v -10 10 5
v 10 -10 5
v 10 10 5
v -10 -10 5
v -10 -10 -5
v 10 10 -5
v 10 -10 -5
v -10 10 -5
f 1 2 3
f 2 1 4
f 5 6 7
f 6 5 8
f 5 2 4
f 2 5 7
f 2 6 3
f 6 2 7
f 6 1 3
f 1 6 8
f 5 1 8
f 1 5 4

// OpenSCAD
// Placeholder enclosure model.
//
// Real enclosure geometry (two shells, button plungers, antenna mount, USB-C
// cutout) lands via pilink-8hx. This trivial cube exists only to seed the
// docker-compose preview pipeline (preview/) so the OpenSCAD -> STL -> GLB
// export chain already works end-to-end the moment real geometry lands here.
cube([20, 20, 10], center = true);
